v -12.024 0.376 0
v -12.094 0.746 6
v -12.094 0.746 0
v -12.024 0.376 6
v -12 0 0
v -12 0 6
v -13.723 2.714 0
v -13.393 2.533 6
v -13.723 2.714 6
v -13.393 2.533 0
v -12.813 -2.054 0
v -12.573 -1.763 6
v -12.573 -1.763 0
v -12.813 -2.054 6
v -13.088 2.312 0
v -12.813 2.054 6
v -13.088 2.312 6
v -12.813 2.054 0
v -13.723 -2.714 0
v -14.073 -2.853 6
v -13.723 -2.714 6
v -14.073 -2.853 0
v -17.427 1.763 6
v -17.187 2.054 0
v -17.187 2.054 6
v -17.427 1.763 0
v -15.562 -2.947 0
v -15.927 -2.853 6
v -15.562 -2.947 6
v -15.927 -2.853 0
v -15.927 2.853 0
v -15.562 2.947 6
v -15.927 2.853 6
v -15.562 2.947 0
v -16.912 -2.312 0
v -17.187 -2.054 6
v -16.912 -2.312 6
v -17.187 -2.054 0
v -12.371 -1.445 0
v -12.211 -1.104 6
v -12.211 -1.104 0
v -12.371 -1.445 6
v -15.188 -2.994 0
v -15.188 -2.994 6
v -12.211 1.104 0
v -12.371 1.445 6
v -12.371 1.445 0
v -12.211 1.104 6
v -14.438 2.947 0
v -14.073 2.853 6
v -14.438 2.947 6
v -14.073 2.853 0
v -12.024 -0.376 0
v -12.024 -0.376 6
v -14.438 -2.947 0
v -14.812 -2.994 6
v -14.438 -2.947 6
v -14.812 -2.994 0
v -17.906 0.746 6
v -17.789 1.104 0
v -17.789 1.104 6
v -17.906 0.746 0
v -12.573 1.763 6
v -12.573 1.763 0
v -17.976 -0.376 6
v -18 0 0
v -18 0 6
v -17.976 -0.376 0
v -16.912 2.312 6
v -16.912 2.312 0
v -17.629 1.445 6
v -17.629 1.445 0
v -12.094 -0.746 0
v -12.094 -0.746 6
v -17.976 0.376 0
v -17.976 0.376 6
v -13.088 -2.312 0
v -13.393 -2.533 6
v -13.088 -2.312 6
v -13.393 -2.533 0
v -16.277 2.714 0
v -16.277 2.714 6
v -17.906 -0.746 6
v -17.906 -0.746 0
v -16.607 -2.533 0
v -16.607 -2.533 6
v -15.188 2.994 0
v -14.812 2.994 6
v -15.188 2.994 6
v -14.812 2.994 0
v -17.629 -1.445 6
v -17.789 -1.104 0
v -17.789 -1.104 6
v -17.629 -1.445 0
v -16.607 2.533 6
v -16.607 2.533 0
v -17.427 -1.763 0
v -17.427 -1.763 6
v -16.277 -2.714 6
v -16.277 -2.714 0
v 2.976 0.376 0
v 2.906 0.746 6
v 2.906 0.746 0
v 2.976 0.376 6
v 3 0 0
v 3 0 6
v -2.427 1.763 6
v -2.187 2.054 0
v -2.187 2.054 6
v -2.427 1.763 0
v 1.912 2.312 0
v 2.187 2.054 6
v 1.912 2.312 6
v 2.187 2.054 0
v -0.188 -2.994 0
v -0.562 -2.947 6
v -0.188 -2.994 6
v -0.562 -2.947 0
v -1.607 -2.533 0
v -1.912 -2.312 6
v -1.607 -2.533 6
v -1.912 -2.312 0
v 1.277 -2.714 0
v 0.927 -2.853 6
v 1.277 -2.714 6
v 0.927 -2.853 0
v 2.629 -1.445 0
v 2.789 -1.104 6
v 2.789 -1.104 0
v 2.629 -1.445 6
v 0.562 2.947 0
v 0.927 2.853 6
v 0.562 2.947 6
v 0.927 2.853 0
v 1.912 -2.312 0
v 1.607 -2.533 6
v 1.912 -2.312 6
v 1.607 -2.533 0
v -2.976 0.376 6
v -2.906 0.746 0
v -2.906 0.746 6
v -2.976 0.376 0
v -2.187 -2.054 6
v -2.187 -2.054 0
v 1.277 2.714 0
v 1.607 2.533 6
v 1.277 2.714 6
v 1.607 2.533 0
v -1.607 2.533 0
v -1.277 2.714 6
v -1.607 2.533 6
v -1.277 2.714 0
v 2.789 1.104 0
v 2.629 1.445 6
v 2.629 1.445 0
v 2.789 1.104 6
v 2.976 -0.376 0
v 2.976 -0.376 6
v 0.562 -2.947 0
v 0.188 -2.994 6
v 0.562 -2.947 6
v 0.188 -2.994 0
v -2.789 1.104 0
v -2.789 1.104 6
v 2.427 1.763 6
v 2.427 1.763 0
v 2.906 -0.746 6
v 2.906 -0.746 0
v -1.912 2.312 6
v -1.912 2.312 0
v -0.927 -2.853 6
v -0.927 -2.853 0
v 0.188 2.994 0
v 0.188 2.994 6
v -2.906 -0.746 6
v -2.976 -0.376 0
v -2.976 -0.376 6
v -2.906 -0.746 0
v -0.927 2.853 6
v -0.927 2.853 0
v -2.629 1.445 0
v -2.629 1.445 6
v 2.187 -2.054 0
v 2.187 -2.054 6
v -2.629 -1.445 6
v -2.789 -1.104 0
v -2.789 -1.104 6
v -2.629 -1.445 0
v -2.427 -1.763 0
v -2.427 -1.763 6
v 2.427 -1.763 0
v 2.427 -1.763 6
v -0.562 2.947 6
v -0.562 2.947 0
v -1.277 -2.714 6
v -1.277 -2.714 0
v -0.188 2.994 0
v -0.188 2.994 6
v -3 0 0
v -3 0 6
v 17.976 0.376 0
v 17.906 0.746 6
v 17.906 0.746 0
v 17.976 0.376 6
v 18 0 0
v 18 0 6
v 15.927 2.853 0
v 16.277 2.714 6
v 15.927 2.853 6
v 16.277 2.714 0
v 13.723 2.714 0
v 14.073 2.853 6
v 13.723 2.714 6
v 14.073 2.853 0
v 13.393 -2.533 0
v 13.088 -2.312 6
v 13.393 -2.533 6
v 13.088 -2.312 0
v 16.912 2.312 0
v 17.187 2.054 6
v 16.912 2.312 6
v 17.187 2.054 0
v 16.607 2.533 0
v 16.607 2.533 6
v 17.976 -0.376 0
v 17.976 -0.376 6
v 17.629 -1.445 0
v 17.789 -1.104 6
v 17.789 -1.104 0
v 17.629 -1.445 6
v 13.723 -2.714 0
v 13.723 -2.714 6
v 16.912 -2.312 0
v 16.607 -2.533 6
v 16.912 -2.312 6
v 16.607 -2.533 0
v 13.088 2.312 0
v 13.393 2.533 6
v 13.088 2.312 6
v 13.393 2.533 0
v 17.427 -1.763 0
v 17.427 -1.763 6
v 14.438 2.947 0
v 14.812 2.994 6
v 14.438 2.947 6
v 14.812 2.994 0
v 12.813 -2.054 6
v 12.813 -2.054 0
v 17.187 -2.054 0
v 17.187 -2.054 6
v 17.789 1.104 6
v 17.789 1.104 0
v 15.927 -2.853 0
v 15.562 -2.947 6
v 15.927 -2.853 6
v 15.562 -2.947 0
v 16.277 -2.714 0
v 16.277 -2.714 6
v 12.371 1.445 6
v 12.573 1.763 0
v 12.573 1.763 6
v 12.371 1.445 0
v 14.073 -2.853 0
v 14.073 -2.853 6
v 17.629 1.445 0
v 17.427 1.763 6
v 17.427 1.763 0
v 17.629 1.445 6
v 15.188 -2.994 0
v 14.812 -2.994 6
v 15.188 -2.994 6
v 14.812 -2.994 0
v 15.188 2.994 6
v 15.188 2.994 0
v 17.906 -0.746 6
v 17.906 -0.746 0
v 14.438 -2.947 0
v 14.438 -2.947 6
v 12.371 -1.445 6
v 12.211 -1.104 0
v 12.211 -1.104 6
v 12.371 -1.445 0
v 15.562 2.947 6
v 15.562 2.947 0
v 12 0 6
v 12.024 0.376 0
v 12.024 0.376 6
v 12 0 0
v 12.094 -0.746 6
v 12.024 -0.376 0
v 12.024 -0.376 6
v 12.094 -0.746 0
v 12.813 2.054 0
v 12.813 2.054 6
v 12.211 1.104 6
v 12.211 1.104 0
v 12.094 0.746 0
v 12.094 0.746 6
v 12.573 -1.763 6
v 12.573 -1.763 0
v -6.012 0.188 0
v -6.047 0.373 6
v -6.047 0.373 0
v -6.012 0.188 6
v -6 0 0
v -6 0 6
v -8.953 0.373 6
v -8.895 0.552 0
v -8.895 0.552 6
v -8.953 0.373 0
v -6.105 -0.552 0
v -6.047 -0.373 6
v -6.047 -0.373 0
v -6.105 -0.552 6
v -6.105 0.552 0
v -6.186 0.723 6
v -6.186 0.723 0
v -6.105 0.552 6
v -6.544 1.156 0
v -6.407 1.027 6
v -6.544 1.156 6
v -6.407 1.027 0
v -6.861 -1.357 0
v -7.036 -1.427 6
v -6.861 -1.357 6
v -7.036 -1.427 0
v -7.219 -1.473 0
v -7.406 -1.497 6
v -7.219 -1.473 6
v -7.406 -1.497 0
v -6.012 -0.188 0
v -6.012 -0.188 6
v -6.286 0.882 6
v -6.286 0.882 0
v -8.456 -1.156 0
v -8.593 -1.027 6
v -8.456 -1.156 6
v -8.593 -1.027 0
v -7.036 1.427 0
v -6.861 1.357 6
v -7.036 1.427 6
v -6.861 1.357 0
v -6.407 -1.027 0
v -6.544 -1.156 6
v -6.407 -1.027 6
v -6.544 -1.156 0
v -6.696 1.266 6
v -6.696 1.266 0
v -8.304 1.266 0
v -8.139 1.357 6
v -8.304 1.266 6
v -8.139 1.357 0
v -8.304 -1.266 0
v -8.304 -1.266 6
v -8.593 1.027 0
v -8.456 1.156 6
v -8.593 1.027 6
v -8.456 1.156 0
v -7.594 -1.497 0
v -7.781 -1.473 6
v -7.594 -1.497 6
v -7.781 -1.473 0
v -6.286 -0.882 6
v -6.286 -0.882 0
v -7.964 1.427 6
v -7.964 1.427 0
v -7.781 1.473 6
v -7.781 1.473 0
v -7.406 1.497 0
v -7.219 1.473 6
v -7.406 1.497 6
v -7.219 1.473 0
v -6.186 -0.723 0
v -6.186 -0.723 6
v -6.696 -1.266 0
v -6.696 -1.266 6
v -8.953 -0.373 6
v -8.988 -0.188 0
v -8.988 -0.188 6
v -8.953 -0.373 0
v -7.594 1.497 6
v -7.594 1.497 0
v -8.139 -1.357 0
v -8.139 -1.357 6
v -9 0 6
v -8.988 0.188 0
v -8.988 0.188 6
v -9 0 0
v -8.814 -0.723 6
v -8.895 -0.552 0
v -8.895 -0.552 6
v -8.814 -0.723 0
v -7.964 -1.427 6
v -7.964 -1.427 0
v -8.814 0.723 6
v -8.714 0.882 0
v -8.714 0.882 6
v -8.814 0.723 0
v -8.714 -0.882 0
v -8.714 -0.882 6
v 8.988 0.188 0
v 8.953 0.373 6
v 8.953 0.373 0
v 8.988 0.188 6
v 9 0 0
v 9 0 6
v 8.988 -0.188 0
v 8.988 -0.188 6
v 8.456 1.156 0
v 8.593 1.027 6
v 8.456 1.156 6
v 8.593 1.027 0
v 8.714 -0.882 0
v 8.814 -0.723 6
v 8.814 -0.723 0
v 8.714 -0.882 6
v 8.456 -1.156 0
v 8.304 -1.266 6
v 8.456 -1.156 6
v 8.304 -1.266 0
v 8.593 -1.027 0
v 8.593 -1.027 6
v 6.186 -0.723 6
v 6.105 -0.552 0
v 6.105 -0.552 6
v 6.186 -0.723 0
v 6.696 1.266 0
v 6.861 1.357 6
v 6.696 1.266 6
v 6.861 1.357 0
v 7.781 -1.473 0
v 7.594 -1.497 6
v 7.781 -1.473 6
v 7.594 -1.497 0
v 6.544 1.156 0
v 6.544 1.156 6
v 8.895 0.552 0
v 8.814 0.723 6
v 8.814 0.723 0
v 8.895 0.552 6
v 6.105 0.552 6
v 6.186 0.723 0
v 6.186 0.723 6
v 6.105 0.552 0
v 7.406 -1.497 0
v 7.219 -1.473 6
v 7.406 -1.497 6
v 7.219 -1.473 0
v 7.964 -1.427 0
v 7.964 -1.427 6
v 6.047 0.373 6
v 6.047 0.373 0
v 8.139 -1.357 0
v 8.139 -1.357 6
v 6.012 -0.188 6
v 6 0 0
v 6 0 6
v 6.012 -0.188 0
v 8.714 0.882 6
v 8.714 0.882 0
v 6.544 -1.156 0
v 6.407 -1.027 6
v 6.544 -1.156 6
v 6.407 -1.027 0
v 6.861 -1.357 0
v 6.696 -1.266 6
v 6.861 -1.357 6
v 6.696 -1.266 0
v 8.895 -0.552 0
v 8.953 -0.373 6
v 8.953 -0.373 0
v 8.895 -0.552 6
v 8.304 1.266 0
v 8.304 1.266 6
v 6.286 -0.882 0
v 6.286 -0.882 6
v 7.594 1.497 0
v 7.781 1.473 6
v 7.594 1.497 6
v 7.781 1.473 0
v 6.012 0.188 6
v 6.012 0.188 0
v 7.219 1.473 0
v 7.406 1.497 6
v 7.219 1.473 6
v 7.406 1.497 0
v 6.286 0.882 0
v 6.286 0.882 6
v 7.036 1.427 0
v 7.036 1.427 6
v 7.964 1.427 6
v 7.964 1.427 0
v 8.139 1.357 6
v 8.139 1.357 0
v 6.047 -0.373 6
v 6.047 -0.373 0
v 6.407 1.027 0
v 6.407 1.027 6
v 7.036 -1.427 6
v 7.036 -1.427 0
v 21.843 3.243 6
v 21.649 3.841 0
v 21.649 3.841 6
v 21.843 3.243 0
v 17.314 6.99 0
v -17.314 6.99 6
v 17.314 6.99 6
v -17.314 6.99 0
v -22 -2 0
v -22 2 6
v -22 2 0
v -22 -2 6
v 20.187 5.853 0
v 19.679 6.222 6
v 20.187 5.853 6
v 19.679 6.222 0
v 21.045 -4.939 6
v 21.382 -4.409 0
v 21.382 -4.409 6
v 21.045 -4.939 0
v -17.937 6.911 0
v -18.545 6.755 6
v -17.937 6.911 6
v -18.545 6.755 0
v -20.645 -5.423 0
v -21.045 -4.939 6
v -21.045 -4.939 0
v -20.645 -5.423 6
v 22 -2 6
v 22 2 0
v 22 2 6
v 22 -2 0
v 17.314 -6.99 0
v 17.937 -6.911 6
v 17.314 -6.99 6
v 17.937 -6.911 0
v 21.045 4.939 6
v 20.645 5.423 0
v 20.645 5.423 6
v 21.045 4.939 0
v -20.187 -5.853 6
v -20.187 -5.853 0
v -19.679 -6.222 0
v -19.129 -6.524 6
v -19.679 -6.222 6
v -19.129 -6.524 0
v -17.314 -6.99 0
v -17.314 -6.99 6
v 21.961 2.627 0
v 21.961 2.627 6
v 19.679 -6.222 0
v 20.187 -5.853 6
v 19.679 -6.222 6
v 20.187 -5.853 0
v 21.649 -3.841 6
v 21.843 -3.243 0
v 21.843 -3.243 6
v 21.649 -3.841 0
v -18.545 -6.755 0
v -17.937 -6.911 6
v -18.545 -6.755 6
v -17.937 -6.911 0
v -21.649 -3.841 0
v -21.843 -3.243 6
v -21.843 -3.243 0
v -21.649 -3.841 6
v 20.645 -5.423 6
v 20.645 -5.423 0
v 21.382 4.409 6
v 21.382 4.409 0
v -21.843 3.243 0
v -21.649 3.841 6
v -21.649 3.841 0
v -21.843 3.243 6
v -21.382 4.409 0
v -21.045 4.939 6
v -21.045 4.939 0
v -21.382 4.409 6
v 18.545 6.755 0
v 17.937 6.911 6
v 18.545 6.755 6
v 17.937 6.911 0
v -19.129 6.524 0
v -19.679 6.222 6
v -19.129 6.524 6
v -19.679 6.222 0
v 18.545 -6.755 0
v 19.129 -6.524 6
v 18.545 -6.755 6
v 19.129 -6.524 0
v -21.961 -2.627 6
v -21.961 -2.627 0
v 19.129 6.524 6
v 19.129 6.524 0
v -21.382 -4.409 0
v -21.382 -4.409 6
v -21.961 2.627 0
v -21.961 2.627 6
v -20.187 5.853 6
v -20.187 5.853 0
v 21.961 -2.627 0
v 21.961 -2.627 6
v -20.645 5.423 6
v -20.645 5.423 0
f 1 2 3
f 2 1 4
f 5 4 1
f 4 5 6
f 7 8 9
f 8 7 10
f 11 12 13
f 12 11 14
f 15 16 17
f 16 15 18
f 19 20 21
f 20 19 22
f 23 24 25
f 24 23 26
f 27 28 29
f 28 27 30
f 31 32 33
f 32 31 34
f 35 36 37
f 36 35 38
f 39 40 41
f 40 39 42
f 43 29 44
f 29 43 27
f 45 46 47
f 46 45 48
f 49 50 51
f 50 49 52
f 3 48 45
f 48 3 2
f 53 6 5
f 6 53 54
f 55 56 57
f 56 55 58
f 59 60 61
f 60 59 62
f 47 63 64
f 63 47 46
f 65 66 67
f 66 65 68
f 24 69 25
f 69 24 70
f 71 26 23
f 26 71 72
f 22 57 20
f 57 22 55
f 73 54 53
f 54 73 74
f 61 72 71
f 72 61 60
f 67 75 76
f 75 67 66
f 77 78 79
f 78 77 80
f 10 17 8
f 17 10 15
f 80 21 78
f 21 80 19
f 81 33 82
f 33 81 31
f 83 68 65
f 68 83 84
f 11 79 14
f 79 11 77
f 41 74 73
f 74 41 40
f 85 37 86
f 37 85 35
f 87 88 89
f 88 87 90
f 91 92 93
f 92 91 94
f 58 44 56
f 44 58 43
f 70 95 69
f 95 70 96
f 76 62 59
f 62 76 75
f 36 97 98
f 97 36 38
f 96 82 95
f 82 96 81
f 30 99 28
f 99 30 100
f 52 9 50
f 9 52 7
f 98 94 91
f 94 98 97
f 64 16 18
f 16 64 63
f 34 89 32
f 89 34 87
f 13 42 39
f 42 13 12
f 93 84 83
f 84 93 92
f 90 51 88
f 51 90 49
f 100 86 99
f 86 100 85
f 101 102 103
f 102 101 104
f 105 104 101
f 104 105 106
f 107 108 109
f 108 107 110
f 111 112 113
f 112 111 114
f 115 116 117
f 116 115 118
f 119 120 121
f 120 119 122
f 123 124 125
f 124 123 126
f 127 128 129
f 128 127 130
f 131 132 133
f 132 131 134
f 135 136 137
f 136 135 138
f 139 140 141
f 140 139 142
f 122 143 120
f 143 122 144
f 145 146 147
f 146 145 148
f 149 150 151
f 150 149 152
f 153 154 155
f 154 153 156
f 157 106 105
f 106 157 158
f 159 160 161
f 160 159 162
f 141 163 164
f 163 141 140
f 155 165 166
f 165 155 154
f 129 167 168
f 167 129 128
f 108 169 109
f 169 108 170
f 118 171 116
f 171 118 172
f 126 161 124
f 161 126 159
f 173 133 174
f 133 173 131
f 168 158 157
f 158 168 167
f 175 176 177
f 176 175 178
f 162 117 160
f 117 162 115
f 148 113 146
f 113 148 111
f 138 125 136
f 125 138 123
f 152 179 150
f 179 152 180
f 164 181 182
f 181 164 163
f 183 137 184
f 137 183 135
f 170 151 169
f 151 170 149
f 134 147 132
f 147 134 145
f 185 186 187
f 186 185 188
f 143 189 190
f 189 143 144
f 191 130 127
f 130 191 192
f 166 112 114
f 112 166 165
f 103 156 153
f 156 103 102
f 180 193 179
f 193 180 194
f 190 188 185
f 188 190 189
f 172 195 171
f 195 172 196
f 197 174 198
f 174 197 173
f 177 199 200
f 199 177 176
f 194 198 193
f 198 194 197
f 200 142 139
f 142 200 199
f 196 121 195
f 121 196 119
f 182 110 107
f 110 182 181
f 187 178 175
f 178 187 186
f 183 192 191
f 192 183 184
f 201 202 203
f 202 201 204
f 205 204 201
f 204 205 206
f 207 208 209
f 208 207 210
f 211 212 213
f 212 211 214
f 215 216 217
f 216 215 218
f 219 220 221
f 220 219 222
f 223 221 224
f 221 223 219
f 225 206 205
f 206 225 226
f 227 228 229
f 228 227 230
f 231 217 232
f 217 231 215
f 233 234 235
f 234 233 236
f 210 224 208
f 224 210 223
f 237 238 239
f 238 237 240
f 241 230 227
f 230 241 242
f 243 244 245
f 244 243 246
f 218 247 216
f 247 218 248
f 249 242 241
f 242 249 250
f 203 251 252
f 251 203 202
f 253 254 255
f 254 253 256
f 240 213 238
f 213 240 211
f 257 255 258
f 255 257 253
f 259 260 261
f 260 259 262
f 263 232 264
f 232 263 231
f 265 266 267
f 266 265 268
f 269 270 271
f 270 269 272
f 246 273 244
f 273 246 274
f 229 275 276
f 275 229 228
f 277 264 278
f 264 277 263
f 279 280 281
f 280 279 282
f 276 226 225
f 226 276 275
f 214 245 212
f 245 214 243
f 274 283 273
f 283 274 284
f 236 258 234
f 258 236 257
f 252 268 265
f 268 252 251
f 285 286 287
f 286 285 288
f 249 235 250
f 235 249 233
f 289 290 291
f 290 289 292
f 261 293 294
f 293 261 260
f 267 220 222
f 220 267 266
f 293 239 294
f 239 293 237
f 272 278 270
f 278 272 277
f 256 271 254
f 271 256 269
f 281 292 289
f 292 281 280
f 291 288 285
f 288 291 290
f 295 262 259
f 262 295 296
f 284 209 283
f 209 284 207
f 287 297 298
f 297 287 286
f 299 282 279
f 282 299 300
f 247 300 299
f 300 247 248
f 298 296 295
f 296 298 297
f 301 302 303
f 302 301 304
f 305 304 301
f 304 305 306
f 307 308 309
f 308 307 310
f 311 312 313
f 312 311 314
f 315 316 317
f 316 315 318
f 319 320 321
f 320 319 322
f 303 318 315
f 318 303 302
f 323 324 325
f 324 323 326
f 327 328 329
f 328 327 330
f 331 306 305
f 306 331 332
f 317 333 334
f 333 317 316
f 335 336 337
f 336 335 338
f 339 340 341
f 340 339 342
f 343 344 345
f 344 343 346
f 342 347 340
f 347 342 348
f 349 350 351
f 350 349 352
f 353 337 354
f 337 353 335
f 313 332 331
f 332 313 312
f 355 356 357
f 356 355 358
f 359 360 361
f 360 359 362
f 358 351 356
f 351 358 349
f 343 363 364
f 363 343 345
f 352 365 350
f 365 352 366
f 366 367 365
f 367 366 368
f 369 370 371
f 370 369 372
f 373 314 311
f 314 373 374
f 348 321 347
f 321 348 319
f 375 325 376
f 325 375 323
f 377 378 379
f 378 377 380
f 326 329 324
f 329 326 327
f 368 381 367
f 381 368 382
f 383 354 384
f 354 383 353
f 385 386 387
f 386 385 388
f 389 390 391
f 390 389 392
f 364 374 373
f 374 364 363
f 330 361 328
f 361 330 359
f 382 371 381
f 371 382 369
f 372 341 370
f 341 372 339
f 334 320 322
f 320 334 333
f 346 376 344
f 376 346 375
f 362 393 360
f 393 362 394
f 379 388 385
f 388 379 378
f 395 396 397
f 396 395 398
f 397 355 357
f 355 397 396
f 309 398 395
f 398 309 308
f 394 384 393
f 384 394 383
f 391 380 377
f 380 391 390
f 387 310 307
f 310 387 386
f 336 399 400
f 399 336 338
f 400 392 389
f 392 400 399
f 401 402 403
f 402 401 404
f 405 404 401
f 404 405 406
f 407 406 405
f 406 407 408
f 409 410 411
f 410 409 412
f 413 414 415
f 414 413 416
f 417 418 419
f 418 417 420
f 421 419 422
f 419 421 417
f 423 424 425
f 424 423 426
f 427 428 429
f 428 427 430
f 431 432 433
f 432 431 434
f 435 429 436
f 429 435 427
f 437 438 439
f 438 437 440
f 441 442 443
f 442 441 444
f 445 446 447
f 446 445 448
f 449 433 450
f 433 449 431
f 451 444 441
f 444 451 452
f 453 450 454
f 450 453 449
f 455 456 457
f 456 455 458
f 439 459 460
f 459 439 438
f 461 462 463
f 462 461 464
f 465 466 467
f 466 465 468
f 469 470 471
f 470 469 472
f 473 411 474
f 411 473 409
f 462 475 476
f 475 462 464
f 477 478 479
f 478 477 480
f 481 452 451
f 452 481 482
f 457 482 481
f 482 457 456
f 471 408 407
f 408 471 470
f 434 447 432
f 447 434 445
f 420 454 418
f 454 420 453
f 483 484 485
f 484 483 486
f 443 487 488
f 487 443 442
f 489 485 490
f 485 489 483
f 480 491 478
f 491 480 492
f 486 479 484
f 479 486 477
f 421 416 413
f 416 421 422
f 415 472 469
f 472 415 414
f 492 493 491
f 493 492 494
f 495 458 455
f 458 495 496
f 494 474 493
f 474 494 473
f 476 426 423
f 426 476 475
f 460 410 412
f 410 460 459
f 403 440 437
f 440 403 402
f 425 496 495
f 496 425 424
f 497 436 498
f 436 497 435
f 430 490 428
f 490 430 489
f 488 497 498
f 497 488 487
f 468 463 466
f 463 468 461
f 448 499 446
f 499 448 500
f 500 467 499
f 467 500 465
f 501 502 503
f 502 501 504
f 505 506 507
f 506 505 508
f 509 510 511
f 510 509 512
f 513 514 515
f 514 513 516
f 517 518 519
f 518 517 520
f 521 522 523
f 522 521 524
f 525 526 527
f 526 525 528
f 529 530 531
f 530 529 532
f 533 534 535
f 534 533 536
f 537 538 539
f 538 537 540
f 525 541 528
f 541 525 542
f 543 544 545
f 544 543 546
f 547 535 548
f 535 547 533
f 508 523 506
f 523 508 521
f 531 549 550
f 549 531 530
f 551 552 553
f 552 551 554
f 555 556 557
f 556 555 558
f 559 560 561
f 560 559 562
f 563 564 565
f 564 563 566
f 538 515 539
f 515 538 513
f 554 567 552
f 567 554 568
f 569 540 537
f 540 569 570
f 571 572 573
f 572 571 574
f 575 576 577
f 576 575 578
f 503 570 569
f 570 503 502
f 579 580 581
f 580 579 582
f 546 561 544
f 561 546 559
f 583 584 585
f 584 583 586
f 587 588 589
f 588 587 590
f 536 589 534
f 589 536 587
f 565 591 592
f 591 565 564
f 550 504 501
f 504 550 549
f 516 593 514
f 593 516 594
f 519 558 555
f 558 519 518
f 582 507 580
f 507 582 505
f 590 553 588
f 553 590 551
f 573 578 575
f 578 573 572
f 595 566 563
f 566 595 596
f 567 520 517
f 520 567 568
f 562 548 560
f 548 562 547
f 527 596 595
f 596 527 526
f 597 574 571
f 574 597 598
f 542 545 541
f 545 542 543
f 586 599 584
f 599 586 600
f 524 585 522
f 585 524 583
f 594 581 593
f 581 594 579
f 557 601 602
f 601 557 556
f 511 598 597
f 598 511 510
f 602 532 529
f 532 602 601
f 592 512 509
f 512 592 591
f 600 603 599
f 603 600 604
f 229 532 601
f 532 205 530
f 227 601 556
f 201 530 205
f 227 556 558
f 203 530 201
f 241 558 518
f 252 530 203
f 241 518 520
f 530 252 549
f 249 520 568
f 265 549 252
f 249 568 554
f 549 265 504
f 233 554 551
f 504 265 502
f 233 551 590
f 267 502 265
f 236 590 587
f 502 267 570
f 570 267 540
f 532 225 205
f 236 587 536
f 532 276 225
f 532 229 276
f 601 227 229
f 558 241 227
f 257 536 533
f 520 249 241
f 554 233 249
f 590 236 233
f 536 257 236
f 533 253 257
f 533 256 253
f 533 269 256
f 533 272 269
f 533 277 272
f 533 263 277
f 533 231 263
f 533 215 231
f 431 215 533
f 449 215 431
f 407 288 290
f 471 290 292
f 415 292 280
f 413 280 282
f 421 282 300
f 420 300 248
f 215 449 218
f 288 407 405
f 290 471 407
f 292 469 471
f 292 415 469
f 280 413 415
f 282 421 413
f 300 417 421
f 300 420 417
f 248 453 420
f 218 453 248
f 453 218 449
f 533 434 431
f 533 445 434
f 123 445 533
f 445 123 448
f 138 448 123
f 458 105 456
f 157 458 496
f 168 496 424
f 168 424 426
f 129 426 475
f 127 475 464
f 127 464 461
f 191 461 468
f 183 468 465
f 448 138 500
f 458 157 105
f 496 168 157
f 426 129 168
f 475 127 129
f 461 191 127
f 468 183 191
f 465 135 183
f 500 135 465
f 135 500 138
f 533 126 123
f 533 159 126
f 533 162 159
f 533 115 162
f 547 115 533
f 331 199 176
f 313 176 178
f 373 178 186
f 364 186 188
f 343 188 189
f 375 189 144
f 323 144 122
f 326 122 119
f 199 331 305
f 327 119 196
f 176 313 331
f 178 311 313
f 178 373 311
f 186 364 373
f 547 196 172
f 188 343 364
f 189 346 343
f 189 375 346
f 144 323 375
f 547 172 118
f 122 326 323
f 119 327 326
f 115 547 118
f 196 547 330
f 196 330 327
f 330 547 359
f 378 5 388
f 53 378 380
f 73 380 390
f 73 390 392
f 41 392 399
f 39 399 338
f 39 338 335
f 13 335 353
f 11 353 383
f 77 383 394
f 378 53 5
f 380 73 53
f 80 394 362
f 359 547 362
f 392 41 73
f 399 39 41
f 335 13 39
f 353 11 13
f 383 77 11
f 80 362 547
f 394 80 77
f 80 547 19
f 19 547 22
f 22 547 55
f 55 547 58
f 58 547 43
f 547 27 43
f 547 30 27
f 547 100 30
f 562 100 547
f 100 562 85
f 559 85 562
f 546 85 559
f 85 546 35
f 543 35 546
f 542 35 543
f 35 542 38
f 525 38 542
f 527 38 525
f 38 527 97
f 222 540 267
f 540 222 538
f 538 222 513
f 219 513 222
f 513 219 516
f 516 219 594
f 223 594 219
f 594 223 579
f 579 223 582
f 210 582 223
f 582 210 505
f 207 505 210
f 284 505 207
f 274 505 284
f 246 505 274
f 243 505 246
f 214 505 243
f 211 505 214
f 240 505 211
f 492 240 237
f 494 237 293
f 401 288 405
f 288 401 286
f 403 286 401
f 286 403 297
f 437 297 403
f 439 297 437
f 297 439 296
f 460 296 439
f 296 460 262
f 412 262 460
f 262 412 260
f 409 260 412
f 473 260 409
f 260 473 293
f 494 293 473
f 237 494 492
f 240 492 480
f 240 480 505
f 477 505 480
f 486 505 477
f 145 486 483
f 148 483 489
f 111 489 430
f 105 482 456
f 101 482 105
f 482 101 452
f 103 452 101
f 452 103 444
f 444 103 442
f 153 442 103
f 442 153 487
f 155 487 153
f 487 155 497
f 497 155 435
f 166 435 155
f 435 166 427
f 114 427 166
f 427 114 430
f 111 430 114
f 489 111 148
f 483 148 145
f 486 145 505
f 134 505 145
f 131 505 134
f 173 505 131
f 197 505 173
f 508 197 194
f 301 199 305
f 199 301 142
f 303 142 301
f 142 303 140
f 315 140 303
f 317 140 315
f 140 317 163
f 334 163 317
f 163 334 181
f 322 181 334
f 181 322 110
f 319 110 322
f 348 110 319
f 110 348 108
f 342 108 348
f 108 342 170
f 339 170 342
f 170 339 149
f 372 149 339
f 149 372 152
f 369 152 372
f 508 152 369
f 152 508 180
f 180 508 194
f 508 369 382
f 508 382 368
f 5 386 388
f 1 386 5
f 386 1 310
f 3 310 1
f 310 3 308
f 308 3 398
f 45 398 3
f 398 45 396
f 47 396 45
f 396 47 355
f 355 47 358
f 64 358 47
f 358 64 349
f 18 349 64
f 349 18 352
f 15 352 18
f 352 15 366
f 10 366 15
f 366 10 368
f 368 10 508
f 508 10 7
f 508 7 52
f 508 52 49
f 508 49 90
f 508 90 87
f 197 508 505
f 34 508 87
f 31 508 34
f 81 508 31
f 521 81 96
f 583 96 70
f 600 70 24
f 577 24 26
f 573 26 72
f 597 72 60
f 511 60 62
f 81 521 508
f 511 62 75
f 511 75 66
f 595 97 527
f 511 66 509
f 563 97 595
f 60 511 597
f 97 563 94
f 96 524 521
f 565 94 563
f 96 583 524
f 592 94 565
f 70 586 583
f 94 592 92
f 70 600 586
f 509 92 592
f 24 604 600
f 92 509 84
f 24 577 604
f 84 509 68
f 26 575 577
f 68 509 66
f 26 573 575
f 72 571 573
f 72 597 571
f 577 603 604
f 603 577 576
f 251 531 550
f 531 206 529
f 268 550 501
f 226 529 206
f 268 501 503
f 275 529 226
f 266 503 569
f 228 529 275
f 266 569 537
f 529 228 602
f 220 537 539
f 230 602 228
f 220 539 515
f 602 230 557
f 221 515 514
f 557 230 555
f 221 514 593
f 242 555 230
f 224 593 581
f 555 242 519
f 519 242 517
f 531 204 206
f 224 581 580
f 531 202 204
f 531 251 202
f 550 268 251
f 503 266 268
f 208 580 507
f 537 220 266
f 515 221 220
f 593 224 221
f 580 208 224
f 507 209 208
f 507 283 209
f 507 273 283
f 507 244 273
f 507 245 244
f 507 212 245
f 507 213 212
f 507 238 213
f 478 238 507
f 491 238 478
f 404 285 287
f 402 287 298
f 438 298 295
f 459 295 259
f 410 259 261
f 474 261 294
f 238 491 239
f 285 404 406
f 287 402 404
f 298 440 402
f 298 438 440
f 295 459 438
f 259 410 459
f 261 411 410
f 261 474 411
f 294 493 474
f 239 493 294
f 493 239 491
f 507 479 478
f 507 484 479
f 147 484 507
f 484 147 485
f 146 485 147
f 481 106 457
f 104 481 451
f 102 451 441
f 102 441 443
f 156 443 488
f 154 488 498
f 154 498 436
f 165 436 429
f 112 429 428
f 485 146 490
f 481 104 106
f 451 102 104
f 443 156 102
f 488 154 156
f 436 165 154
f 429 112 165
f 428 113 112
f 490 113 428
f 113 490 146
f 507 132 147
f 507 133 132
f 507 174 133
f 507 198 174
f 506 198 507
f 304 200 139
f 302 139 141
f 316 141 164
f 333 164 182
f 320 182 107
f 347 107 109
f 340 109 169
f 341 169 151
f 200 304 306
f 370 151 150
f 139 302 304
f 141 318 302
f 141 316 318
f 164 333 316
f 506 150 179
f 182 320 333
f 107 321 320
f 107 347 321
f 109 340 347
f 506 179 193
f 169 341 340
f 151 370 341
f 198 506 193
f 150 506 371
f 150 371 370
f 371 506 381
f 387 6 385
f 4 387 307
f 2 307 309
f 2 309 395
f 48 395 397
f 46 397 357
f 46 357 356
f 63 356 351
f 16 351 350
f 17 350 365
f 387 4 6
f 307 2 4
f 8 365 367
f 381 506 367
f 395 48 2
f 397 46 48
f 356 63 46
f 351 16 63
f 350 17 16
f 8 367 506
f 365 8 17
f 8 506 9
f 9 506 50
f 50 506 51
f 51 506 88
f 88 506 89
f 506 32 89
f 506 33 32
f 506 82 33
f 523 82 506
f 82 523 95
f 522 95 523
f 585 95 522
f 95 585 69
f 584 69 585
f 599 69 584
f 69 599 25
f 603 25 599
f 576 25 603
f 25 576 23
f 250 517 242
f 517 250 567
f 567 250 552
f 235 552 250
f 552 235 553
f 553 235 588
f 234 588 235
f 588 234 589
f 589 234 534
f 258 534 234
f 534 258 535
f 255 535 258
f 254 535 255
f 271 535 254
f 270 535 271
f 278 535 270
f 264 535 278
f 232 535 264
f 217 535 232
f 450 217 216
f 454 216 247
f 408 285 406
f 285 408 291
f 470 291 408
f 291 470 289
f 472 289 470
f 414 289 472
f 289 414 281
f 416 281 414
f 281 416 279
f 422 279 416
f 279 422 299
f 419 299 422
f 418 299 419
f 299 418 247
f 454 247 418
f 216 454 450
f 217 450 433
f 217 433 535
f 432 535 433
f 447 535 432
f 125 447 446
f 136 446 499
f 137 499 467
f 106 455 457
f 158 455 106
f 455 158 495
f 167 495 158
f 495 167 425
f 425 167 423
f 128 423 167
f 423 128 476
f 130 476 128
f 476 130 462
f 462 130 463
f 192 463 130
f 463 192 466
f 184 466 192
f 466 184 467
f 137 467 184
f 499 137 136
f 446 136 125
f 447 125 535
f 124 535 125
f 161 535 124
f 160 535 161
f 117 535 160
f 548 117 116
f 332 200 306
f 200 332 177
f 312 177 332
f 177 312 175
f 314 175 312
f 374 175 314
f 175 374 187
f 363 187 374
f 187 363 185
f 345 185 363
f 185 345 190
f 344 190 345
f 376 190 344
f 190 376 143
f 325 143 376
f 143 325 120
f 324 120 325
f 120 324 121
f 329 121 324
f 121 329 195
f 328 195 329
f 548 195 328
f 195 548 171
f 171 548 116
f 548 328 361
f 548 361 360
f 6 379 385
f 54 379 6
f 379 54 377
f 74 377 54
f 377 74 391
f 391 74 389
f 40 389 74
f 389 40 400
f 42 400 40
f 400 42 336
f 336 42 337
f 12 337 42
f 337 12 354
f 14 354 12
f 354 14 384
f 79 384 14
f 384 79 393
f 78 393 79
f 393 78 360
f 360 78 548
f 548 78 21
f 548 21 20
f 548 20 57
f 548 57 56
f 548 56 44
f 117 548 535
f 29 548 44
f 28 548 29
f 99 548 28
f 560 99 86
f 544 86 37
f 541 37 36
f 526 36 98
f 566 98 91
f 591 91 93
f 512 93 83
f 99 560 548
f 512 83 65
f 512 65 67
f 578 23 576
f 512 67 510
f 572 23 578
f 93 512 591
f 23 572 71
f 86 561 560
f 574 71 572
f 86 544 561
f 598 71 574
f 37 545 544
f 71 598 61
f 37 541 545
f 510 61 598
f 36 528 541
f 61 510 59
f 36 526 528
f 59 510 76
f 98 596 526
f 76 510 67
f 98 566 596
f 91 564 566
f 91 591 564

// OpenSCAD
$fn = 50;


difference() {
	union() {
		*color(alpha = 1.0000000000, c = "gray") {
			translate(v = [0, 7, 0]) {
				linear_extrude(height = 1) {
					text(font = "Arial:style=Bold", halign = "center", size = 4.5000000000, text = "COMMENT plate main", valign = "center");
				}
			}
		}
		hull() {
			translate(v = [-17.0000000000, 2.0000000000, 0]) {
				cylinder(h = 6, r = 5);
			}
			translate(v = [17.0000000000, 2.0000000000, 0]) {
				cylinder(h = 6, r = 5);
			}
			translate(v = [-17.0000000000, -2.0000000000, 0]) {
				cylinder(h = 6, r = 5);
			}
			translate(v = [17.0000000000, -2.0000000000, 0]) {
				cylinder(h = 6, r = 5);
			}
		}
	}
	union() {
		*color(alpha = 1.0000000000, c = "gray") {
			translate(v = [0, 7, 0]) {
				linear_extrude(height = 1) {
					text(font = "Arial:style=Bold", halign = "center", size = 4.5000000000, text = "COMMENT holes main", valign = "center");
				}
			}
		}
		translate(v = [-15.0000000000, 0.0000000000, 0]) {
			translate(v = [0, 0, -100]) {
				cylinder(h = 200, r = 3.0000000000);
			}
		}
		translate(v = [0, 0, -100]) {
			cylinder(h = 200, r = 3.0000000000);
		}
		translate(v = [15.0000000000, 0.0000000000, 0]) {
			translate(v = [0, 0, -100]) {
				cylinder(h = 200, r = 3.0000000000);
			}
		}
		translate(v = [-15.0000000000, 0.0000000000, 0]) {
			translate(v = [0, 0, -100]) {
				cylinder(h = 200, r = 1.5000000000);
			}
		}
		translate(v = [-7.5000000000, 0.0000000000, 0]) {
			translate(v = [0, 0, -100]) {
				cylinder(h = 200, r = 1.5000000000);
			}
		}
		translate(v = [0, 0, -100]) {
			cylinder(h = 200, r = 1.5000000000);
		}
		translate(v = [7.5000000000, 0.0000000000, 0]) {
			translate(v = [0, 0, -100]) {
				cylinder(h = 200, r = 1.5000000000);
			}
		}
		translate(v = [15.0000000000, 0.0000000000, 0]) {
			translate(v = [0, 0, -100]) {
				cylinder(h = 200, r = 1.5000000000);
			}
		}
	}
}
